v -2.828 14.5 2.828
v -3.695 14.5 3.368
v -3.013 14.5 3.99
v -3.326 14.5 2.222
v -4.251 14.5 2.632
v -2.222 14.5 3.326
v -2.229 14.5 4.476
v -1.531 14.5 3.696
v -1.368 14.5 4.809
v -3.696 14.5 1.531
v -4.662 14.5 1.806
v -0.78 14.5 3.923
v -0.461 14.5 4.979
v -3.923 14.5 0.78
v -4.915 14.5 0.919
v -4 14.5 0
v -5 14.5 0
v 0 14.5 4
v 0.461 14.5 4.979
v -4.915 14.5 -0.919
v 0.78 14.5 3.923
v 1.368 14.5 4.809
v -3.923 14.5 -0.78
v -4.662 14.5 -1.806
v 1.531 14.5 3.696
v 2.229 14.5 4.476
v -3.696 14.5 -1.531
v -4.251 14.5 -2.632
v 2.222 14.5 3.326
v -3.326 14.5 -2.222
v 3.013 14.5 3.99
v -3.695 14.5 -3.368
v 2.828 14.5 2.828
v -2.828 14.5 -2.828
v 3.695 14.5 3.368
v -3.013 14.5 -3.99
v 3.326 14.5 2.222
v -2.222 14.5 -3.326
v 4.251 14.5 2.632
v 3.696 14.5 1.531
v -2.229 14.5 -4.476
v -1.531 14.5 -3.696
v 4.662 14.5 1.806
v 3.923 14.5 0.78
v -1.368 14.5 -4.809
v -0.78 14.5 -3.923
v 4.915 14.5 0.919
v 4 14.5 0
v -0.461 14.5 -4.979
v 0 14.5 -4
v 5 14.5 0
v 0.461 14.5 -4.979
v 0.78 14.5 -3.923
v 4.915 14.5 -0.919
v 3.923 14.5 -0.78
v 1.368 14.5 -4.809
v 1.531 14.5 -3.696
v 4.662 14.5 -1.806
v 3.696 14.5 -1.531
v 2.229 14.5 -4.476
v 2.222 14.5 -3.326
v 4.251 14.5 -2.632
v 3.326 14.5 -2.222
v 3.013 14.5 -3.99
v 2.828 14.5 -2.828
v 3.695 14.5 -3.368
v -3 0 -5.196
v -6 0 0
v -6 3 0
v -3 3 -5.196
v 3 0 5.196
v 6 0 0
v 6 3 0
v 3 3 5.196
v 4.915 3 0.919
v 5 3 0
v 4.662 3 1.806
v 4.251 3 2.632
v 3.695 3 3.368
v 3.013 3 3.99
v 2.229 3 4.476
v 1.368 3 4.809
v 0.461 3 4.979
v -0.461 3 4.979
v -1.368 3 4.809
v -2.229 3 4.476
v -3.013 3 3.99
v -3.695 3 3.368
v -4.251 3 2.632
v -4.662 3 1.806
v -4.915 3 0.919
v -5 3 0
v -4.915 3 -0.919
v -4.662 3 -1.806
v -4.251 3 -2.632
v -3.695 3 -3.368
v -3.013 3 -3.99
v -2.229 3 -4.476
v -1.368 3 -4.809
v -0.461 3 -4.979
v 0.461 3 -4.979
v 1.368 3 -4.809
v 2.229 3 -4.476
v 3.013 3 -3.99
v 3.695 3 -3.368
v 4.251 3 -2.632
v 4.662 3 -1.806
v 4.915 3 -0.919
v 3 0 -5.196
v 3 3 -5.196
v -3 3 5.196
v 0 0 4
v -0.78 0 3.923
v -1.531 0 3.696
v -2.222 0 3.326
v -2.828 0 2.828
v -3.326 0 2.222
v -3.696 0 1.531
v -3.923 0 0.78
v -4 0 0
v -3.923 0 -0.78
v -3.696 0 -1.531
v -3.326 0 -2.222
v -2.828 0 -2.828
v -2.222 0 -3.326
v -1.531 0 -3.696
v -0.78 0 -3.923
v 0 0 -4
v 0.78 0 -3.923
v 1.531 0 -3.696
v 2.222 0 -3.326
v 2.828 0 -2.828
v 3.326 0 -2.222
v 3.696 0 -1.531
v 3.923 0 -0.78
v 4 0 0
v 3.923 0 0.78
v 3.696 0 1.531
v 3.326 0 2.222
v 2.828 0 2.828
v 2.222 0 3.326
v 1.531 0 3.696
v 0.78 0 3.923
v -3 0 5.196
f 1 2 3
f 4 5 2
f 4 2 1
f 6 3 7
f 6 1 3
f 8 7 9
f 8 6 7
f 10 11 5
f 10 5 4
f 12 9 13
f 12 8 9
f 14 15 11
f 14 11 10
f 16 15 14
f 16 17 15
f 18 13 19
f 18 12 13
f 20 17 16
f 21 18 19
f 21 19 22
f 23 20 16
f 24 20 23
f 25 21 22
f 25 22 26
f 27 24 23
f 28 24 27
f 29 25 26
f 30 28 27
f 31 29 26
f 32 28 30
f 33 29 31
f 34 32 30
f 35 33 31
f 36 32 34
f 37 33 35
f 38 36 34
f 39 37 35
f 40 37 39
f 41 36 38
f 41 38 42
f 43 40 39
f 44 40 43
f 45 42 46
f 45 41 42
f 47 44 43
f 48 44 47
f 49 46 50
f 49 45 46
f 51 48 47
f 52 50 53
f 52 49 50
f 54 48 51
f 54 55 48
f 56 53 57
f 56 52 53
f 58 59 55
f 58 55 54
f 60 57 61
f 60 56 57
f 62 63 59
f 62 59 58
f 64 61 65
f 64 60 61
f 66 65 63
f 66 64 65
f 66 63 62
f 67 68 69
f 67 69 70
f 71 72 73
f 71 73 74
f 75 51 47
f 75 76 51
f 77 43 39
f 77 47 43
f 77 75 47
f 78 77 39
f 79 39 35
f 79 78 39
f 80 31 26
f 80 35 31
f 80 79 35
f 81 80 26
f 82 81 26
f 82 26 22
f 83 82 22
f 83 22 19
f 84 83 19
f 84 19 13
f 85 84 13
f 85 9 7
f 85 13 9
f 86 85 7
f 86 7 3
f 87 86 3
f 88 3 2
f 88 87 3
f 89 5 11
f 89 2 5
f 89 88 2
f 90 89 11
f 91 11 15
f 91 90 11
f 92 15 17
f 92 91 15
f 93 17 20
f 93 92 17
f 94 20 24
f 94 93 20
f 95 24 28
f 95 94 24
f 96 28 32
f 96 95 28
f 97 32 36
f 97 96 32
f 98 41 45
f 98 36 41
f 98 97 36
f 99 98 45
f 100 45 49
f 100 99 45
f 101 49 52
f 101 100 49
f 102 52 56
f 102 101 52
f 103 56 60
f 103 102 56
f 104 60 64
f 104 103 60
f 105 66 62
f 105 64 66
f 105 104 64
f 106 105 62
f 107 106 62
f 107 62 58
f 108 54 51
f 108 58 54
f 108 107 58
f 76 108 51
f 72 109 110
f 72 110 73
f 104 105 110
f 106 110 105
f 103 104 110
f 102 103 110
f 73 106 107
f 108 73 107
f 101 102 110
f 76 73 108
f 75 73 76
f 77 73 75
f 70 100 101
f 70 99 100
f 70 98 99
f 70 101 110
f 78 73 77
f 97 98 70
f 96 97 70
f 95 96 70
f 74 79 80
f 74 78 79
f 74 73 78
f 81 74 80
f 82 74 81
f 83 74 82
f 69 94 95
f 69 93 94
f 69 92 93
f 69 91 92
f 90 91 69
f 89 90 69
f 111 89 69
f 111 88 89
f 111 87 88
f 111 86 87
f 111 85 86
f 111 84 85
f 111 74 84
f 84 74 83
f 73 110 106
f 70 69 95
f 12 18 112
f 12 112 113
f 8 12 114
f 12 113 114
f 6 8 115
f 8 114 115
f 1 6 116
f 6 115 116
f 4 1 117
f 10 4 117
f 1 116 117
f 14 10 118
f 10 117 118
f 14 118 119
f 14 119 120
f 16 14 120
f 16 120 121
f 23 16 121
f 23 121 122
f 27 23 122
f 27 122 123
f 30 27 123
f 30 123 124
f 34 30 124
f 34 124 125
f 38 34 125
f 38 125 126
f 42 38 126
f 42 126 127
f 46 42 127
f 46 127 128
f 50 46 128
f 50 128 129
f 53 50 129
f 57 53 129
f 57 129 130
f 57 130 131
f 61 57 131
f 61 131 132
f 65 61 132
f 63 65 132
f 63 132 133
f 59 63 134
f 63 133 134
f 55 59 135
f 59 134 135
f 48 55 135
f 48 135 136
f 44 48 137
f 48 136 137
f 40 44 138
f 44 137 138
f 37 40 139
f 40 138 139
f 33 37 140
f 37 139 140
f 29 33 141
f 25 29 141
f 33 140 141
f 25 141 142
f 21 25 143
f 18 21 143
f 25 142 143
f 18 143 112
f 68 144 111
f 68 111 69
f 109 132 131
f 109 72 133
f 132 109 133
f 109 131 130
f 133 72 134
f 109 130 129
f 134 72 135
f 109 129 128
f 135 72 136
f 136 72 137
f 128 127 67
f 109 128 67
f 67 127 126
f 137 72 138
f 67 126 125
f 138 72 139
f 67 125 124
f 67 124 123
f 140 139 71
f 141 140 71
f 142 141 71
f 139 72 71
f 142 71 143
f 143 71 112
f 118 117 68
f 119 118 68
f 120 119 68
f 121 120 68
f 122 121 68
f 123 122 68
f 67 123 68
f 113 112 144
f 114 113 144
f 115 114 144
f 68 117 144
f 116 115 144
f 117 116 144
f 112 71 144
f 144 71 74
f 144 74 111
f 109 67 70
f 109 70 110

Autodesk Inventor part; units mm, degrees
ref_plane "YZ Plane" through (0, 0, 0) normal (1, 0, 0) x (0, 1, 0)
ref_plane "XZ Plane" through (0, 0, 0) normal (0, 1, 0) x (-1, 0, 0)
ref_plane "XY Plane" through (0, 0, 0) normal (0, 0, 1) x (1, 0, 0)
sketch "Skizze1" plane through (0, 0, 0) normal (0, 1, 0) x (-1, 0, 0)
  line L0 (6, 0) -> (3, -5.1962)
  line L1 (3, -5.1962) -> (-3, -5.1962)
  line L2 (-3, -5.1962) -> (-6, 0)
  line L3 (-6, 0) -> (-3, 5.1962)
  line L4 (-3, 5.1962) -> (3, 5.1962)
  line L5 (3, 5.1962) -> (6, 0)
  point P0 (0, 0)
  point P1 (0, 0)
  dimension "d5" = 12
extrude "Extrusion3" add sketch "Skizze1" along normal blind 3
sketch "Sketch4" plane through (0, 3, 0) normal (0, 1, 0) x (1, 0, 0)
  circle A0 centre (0, 0) radius 5
  dimension "d12" = 10
extrude "Extrusion4" add sketch "Sketch4" along normal blind 11.5
sketch "Sketch5" plane through (0, 14.5, 0) normal (0, 1, 0) x (1, 0, 0)
  circle A0 centre (0, 0) radius 5 construction
hole "Hole1" at (0, 14.5, 0) direction (0, -1, 0) diameter 8 depth 14.5
properties part number "überwurfmutter" material "Gold"
